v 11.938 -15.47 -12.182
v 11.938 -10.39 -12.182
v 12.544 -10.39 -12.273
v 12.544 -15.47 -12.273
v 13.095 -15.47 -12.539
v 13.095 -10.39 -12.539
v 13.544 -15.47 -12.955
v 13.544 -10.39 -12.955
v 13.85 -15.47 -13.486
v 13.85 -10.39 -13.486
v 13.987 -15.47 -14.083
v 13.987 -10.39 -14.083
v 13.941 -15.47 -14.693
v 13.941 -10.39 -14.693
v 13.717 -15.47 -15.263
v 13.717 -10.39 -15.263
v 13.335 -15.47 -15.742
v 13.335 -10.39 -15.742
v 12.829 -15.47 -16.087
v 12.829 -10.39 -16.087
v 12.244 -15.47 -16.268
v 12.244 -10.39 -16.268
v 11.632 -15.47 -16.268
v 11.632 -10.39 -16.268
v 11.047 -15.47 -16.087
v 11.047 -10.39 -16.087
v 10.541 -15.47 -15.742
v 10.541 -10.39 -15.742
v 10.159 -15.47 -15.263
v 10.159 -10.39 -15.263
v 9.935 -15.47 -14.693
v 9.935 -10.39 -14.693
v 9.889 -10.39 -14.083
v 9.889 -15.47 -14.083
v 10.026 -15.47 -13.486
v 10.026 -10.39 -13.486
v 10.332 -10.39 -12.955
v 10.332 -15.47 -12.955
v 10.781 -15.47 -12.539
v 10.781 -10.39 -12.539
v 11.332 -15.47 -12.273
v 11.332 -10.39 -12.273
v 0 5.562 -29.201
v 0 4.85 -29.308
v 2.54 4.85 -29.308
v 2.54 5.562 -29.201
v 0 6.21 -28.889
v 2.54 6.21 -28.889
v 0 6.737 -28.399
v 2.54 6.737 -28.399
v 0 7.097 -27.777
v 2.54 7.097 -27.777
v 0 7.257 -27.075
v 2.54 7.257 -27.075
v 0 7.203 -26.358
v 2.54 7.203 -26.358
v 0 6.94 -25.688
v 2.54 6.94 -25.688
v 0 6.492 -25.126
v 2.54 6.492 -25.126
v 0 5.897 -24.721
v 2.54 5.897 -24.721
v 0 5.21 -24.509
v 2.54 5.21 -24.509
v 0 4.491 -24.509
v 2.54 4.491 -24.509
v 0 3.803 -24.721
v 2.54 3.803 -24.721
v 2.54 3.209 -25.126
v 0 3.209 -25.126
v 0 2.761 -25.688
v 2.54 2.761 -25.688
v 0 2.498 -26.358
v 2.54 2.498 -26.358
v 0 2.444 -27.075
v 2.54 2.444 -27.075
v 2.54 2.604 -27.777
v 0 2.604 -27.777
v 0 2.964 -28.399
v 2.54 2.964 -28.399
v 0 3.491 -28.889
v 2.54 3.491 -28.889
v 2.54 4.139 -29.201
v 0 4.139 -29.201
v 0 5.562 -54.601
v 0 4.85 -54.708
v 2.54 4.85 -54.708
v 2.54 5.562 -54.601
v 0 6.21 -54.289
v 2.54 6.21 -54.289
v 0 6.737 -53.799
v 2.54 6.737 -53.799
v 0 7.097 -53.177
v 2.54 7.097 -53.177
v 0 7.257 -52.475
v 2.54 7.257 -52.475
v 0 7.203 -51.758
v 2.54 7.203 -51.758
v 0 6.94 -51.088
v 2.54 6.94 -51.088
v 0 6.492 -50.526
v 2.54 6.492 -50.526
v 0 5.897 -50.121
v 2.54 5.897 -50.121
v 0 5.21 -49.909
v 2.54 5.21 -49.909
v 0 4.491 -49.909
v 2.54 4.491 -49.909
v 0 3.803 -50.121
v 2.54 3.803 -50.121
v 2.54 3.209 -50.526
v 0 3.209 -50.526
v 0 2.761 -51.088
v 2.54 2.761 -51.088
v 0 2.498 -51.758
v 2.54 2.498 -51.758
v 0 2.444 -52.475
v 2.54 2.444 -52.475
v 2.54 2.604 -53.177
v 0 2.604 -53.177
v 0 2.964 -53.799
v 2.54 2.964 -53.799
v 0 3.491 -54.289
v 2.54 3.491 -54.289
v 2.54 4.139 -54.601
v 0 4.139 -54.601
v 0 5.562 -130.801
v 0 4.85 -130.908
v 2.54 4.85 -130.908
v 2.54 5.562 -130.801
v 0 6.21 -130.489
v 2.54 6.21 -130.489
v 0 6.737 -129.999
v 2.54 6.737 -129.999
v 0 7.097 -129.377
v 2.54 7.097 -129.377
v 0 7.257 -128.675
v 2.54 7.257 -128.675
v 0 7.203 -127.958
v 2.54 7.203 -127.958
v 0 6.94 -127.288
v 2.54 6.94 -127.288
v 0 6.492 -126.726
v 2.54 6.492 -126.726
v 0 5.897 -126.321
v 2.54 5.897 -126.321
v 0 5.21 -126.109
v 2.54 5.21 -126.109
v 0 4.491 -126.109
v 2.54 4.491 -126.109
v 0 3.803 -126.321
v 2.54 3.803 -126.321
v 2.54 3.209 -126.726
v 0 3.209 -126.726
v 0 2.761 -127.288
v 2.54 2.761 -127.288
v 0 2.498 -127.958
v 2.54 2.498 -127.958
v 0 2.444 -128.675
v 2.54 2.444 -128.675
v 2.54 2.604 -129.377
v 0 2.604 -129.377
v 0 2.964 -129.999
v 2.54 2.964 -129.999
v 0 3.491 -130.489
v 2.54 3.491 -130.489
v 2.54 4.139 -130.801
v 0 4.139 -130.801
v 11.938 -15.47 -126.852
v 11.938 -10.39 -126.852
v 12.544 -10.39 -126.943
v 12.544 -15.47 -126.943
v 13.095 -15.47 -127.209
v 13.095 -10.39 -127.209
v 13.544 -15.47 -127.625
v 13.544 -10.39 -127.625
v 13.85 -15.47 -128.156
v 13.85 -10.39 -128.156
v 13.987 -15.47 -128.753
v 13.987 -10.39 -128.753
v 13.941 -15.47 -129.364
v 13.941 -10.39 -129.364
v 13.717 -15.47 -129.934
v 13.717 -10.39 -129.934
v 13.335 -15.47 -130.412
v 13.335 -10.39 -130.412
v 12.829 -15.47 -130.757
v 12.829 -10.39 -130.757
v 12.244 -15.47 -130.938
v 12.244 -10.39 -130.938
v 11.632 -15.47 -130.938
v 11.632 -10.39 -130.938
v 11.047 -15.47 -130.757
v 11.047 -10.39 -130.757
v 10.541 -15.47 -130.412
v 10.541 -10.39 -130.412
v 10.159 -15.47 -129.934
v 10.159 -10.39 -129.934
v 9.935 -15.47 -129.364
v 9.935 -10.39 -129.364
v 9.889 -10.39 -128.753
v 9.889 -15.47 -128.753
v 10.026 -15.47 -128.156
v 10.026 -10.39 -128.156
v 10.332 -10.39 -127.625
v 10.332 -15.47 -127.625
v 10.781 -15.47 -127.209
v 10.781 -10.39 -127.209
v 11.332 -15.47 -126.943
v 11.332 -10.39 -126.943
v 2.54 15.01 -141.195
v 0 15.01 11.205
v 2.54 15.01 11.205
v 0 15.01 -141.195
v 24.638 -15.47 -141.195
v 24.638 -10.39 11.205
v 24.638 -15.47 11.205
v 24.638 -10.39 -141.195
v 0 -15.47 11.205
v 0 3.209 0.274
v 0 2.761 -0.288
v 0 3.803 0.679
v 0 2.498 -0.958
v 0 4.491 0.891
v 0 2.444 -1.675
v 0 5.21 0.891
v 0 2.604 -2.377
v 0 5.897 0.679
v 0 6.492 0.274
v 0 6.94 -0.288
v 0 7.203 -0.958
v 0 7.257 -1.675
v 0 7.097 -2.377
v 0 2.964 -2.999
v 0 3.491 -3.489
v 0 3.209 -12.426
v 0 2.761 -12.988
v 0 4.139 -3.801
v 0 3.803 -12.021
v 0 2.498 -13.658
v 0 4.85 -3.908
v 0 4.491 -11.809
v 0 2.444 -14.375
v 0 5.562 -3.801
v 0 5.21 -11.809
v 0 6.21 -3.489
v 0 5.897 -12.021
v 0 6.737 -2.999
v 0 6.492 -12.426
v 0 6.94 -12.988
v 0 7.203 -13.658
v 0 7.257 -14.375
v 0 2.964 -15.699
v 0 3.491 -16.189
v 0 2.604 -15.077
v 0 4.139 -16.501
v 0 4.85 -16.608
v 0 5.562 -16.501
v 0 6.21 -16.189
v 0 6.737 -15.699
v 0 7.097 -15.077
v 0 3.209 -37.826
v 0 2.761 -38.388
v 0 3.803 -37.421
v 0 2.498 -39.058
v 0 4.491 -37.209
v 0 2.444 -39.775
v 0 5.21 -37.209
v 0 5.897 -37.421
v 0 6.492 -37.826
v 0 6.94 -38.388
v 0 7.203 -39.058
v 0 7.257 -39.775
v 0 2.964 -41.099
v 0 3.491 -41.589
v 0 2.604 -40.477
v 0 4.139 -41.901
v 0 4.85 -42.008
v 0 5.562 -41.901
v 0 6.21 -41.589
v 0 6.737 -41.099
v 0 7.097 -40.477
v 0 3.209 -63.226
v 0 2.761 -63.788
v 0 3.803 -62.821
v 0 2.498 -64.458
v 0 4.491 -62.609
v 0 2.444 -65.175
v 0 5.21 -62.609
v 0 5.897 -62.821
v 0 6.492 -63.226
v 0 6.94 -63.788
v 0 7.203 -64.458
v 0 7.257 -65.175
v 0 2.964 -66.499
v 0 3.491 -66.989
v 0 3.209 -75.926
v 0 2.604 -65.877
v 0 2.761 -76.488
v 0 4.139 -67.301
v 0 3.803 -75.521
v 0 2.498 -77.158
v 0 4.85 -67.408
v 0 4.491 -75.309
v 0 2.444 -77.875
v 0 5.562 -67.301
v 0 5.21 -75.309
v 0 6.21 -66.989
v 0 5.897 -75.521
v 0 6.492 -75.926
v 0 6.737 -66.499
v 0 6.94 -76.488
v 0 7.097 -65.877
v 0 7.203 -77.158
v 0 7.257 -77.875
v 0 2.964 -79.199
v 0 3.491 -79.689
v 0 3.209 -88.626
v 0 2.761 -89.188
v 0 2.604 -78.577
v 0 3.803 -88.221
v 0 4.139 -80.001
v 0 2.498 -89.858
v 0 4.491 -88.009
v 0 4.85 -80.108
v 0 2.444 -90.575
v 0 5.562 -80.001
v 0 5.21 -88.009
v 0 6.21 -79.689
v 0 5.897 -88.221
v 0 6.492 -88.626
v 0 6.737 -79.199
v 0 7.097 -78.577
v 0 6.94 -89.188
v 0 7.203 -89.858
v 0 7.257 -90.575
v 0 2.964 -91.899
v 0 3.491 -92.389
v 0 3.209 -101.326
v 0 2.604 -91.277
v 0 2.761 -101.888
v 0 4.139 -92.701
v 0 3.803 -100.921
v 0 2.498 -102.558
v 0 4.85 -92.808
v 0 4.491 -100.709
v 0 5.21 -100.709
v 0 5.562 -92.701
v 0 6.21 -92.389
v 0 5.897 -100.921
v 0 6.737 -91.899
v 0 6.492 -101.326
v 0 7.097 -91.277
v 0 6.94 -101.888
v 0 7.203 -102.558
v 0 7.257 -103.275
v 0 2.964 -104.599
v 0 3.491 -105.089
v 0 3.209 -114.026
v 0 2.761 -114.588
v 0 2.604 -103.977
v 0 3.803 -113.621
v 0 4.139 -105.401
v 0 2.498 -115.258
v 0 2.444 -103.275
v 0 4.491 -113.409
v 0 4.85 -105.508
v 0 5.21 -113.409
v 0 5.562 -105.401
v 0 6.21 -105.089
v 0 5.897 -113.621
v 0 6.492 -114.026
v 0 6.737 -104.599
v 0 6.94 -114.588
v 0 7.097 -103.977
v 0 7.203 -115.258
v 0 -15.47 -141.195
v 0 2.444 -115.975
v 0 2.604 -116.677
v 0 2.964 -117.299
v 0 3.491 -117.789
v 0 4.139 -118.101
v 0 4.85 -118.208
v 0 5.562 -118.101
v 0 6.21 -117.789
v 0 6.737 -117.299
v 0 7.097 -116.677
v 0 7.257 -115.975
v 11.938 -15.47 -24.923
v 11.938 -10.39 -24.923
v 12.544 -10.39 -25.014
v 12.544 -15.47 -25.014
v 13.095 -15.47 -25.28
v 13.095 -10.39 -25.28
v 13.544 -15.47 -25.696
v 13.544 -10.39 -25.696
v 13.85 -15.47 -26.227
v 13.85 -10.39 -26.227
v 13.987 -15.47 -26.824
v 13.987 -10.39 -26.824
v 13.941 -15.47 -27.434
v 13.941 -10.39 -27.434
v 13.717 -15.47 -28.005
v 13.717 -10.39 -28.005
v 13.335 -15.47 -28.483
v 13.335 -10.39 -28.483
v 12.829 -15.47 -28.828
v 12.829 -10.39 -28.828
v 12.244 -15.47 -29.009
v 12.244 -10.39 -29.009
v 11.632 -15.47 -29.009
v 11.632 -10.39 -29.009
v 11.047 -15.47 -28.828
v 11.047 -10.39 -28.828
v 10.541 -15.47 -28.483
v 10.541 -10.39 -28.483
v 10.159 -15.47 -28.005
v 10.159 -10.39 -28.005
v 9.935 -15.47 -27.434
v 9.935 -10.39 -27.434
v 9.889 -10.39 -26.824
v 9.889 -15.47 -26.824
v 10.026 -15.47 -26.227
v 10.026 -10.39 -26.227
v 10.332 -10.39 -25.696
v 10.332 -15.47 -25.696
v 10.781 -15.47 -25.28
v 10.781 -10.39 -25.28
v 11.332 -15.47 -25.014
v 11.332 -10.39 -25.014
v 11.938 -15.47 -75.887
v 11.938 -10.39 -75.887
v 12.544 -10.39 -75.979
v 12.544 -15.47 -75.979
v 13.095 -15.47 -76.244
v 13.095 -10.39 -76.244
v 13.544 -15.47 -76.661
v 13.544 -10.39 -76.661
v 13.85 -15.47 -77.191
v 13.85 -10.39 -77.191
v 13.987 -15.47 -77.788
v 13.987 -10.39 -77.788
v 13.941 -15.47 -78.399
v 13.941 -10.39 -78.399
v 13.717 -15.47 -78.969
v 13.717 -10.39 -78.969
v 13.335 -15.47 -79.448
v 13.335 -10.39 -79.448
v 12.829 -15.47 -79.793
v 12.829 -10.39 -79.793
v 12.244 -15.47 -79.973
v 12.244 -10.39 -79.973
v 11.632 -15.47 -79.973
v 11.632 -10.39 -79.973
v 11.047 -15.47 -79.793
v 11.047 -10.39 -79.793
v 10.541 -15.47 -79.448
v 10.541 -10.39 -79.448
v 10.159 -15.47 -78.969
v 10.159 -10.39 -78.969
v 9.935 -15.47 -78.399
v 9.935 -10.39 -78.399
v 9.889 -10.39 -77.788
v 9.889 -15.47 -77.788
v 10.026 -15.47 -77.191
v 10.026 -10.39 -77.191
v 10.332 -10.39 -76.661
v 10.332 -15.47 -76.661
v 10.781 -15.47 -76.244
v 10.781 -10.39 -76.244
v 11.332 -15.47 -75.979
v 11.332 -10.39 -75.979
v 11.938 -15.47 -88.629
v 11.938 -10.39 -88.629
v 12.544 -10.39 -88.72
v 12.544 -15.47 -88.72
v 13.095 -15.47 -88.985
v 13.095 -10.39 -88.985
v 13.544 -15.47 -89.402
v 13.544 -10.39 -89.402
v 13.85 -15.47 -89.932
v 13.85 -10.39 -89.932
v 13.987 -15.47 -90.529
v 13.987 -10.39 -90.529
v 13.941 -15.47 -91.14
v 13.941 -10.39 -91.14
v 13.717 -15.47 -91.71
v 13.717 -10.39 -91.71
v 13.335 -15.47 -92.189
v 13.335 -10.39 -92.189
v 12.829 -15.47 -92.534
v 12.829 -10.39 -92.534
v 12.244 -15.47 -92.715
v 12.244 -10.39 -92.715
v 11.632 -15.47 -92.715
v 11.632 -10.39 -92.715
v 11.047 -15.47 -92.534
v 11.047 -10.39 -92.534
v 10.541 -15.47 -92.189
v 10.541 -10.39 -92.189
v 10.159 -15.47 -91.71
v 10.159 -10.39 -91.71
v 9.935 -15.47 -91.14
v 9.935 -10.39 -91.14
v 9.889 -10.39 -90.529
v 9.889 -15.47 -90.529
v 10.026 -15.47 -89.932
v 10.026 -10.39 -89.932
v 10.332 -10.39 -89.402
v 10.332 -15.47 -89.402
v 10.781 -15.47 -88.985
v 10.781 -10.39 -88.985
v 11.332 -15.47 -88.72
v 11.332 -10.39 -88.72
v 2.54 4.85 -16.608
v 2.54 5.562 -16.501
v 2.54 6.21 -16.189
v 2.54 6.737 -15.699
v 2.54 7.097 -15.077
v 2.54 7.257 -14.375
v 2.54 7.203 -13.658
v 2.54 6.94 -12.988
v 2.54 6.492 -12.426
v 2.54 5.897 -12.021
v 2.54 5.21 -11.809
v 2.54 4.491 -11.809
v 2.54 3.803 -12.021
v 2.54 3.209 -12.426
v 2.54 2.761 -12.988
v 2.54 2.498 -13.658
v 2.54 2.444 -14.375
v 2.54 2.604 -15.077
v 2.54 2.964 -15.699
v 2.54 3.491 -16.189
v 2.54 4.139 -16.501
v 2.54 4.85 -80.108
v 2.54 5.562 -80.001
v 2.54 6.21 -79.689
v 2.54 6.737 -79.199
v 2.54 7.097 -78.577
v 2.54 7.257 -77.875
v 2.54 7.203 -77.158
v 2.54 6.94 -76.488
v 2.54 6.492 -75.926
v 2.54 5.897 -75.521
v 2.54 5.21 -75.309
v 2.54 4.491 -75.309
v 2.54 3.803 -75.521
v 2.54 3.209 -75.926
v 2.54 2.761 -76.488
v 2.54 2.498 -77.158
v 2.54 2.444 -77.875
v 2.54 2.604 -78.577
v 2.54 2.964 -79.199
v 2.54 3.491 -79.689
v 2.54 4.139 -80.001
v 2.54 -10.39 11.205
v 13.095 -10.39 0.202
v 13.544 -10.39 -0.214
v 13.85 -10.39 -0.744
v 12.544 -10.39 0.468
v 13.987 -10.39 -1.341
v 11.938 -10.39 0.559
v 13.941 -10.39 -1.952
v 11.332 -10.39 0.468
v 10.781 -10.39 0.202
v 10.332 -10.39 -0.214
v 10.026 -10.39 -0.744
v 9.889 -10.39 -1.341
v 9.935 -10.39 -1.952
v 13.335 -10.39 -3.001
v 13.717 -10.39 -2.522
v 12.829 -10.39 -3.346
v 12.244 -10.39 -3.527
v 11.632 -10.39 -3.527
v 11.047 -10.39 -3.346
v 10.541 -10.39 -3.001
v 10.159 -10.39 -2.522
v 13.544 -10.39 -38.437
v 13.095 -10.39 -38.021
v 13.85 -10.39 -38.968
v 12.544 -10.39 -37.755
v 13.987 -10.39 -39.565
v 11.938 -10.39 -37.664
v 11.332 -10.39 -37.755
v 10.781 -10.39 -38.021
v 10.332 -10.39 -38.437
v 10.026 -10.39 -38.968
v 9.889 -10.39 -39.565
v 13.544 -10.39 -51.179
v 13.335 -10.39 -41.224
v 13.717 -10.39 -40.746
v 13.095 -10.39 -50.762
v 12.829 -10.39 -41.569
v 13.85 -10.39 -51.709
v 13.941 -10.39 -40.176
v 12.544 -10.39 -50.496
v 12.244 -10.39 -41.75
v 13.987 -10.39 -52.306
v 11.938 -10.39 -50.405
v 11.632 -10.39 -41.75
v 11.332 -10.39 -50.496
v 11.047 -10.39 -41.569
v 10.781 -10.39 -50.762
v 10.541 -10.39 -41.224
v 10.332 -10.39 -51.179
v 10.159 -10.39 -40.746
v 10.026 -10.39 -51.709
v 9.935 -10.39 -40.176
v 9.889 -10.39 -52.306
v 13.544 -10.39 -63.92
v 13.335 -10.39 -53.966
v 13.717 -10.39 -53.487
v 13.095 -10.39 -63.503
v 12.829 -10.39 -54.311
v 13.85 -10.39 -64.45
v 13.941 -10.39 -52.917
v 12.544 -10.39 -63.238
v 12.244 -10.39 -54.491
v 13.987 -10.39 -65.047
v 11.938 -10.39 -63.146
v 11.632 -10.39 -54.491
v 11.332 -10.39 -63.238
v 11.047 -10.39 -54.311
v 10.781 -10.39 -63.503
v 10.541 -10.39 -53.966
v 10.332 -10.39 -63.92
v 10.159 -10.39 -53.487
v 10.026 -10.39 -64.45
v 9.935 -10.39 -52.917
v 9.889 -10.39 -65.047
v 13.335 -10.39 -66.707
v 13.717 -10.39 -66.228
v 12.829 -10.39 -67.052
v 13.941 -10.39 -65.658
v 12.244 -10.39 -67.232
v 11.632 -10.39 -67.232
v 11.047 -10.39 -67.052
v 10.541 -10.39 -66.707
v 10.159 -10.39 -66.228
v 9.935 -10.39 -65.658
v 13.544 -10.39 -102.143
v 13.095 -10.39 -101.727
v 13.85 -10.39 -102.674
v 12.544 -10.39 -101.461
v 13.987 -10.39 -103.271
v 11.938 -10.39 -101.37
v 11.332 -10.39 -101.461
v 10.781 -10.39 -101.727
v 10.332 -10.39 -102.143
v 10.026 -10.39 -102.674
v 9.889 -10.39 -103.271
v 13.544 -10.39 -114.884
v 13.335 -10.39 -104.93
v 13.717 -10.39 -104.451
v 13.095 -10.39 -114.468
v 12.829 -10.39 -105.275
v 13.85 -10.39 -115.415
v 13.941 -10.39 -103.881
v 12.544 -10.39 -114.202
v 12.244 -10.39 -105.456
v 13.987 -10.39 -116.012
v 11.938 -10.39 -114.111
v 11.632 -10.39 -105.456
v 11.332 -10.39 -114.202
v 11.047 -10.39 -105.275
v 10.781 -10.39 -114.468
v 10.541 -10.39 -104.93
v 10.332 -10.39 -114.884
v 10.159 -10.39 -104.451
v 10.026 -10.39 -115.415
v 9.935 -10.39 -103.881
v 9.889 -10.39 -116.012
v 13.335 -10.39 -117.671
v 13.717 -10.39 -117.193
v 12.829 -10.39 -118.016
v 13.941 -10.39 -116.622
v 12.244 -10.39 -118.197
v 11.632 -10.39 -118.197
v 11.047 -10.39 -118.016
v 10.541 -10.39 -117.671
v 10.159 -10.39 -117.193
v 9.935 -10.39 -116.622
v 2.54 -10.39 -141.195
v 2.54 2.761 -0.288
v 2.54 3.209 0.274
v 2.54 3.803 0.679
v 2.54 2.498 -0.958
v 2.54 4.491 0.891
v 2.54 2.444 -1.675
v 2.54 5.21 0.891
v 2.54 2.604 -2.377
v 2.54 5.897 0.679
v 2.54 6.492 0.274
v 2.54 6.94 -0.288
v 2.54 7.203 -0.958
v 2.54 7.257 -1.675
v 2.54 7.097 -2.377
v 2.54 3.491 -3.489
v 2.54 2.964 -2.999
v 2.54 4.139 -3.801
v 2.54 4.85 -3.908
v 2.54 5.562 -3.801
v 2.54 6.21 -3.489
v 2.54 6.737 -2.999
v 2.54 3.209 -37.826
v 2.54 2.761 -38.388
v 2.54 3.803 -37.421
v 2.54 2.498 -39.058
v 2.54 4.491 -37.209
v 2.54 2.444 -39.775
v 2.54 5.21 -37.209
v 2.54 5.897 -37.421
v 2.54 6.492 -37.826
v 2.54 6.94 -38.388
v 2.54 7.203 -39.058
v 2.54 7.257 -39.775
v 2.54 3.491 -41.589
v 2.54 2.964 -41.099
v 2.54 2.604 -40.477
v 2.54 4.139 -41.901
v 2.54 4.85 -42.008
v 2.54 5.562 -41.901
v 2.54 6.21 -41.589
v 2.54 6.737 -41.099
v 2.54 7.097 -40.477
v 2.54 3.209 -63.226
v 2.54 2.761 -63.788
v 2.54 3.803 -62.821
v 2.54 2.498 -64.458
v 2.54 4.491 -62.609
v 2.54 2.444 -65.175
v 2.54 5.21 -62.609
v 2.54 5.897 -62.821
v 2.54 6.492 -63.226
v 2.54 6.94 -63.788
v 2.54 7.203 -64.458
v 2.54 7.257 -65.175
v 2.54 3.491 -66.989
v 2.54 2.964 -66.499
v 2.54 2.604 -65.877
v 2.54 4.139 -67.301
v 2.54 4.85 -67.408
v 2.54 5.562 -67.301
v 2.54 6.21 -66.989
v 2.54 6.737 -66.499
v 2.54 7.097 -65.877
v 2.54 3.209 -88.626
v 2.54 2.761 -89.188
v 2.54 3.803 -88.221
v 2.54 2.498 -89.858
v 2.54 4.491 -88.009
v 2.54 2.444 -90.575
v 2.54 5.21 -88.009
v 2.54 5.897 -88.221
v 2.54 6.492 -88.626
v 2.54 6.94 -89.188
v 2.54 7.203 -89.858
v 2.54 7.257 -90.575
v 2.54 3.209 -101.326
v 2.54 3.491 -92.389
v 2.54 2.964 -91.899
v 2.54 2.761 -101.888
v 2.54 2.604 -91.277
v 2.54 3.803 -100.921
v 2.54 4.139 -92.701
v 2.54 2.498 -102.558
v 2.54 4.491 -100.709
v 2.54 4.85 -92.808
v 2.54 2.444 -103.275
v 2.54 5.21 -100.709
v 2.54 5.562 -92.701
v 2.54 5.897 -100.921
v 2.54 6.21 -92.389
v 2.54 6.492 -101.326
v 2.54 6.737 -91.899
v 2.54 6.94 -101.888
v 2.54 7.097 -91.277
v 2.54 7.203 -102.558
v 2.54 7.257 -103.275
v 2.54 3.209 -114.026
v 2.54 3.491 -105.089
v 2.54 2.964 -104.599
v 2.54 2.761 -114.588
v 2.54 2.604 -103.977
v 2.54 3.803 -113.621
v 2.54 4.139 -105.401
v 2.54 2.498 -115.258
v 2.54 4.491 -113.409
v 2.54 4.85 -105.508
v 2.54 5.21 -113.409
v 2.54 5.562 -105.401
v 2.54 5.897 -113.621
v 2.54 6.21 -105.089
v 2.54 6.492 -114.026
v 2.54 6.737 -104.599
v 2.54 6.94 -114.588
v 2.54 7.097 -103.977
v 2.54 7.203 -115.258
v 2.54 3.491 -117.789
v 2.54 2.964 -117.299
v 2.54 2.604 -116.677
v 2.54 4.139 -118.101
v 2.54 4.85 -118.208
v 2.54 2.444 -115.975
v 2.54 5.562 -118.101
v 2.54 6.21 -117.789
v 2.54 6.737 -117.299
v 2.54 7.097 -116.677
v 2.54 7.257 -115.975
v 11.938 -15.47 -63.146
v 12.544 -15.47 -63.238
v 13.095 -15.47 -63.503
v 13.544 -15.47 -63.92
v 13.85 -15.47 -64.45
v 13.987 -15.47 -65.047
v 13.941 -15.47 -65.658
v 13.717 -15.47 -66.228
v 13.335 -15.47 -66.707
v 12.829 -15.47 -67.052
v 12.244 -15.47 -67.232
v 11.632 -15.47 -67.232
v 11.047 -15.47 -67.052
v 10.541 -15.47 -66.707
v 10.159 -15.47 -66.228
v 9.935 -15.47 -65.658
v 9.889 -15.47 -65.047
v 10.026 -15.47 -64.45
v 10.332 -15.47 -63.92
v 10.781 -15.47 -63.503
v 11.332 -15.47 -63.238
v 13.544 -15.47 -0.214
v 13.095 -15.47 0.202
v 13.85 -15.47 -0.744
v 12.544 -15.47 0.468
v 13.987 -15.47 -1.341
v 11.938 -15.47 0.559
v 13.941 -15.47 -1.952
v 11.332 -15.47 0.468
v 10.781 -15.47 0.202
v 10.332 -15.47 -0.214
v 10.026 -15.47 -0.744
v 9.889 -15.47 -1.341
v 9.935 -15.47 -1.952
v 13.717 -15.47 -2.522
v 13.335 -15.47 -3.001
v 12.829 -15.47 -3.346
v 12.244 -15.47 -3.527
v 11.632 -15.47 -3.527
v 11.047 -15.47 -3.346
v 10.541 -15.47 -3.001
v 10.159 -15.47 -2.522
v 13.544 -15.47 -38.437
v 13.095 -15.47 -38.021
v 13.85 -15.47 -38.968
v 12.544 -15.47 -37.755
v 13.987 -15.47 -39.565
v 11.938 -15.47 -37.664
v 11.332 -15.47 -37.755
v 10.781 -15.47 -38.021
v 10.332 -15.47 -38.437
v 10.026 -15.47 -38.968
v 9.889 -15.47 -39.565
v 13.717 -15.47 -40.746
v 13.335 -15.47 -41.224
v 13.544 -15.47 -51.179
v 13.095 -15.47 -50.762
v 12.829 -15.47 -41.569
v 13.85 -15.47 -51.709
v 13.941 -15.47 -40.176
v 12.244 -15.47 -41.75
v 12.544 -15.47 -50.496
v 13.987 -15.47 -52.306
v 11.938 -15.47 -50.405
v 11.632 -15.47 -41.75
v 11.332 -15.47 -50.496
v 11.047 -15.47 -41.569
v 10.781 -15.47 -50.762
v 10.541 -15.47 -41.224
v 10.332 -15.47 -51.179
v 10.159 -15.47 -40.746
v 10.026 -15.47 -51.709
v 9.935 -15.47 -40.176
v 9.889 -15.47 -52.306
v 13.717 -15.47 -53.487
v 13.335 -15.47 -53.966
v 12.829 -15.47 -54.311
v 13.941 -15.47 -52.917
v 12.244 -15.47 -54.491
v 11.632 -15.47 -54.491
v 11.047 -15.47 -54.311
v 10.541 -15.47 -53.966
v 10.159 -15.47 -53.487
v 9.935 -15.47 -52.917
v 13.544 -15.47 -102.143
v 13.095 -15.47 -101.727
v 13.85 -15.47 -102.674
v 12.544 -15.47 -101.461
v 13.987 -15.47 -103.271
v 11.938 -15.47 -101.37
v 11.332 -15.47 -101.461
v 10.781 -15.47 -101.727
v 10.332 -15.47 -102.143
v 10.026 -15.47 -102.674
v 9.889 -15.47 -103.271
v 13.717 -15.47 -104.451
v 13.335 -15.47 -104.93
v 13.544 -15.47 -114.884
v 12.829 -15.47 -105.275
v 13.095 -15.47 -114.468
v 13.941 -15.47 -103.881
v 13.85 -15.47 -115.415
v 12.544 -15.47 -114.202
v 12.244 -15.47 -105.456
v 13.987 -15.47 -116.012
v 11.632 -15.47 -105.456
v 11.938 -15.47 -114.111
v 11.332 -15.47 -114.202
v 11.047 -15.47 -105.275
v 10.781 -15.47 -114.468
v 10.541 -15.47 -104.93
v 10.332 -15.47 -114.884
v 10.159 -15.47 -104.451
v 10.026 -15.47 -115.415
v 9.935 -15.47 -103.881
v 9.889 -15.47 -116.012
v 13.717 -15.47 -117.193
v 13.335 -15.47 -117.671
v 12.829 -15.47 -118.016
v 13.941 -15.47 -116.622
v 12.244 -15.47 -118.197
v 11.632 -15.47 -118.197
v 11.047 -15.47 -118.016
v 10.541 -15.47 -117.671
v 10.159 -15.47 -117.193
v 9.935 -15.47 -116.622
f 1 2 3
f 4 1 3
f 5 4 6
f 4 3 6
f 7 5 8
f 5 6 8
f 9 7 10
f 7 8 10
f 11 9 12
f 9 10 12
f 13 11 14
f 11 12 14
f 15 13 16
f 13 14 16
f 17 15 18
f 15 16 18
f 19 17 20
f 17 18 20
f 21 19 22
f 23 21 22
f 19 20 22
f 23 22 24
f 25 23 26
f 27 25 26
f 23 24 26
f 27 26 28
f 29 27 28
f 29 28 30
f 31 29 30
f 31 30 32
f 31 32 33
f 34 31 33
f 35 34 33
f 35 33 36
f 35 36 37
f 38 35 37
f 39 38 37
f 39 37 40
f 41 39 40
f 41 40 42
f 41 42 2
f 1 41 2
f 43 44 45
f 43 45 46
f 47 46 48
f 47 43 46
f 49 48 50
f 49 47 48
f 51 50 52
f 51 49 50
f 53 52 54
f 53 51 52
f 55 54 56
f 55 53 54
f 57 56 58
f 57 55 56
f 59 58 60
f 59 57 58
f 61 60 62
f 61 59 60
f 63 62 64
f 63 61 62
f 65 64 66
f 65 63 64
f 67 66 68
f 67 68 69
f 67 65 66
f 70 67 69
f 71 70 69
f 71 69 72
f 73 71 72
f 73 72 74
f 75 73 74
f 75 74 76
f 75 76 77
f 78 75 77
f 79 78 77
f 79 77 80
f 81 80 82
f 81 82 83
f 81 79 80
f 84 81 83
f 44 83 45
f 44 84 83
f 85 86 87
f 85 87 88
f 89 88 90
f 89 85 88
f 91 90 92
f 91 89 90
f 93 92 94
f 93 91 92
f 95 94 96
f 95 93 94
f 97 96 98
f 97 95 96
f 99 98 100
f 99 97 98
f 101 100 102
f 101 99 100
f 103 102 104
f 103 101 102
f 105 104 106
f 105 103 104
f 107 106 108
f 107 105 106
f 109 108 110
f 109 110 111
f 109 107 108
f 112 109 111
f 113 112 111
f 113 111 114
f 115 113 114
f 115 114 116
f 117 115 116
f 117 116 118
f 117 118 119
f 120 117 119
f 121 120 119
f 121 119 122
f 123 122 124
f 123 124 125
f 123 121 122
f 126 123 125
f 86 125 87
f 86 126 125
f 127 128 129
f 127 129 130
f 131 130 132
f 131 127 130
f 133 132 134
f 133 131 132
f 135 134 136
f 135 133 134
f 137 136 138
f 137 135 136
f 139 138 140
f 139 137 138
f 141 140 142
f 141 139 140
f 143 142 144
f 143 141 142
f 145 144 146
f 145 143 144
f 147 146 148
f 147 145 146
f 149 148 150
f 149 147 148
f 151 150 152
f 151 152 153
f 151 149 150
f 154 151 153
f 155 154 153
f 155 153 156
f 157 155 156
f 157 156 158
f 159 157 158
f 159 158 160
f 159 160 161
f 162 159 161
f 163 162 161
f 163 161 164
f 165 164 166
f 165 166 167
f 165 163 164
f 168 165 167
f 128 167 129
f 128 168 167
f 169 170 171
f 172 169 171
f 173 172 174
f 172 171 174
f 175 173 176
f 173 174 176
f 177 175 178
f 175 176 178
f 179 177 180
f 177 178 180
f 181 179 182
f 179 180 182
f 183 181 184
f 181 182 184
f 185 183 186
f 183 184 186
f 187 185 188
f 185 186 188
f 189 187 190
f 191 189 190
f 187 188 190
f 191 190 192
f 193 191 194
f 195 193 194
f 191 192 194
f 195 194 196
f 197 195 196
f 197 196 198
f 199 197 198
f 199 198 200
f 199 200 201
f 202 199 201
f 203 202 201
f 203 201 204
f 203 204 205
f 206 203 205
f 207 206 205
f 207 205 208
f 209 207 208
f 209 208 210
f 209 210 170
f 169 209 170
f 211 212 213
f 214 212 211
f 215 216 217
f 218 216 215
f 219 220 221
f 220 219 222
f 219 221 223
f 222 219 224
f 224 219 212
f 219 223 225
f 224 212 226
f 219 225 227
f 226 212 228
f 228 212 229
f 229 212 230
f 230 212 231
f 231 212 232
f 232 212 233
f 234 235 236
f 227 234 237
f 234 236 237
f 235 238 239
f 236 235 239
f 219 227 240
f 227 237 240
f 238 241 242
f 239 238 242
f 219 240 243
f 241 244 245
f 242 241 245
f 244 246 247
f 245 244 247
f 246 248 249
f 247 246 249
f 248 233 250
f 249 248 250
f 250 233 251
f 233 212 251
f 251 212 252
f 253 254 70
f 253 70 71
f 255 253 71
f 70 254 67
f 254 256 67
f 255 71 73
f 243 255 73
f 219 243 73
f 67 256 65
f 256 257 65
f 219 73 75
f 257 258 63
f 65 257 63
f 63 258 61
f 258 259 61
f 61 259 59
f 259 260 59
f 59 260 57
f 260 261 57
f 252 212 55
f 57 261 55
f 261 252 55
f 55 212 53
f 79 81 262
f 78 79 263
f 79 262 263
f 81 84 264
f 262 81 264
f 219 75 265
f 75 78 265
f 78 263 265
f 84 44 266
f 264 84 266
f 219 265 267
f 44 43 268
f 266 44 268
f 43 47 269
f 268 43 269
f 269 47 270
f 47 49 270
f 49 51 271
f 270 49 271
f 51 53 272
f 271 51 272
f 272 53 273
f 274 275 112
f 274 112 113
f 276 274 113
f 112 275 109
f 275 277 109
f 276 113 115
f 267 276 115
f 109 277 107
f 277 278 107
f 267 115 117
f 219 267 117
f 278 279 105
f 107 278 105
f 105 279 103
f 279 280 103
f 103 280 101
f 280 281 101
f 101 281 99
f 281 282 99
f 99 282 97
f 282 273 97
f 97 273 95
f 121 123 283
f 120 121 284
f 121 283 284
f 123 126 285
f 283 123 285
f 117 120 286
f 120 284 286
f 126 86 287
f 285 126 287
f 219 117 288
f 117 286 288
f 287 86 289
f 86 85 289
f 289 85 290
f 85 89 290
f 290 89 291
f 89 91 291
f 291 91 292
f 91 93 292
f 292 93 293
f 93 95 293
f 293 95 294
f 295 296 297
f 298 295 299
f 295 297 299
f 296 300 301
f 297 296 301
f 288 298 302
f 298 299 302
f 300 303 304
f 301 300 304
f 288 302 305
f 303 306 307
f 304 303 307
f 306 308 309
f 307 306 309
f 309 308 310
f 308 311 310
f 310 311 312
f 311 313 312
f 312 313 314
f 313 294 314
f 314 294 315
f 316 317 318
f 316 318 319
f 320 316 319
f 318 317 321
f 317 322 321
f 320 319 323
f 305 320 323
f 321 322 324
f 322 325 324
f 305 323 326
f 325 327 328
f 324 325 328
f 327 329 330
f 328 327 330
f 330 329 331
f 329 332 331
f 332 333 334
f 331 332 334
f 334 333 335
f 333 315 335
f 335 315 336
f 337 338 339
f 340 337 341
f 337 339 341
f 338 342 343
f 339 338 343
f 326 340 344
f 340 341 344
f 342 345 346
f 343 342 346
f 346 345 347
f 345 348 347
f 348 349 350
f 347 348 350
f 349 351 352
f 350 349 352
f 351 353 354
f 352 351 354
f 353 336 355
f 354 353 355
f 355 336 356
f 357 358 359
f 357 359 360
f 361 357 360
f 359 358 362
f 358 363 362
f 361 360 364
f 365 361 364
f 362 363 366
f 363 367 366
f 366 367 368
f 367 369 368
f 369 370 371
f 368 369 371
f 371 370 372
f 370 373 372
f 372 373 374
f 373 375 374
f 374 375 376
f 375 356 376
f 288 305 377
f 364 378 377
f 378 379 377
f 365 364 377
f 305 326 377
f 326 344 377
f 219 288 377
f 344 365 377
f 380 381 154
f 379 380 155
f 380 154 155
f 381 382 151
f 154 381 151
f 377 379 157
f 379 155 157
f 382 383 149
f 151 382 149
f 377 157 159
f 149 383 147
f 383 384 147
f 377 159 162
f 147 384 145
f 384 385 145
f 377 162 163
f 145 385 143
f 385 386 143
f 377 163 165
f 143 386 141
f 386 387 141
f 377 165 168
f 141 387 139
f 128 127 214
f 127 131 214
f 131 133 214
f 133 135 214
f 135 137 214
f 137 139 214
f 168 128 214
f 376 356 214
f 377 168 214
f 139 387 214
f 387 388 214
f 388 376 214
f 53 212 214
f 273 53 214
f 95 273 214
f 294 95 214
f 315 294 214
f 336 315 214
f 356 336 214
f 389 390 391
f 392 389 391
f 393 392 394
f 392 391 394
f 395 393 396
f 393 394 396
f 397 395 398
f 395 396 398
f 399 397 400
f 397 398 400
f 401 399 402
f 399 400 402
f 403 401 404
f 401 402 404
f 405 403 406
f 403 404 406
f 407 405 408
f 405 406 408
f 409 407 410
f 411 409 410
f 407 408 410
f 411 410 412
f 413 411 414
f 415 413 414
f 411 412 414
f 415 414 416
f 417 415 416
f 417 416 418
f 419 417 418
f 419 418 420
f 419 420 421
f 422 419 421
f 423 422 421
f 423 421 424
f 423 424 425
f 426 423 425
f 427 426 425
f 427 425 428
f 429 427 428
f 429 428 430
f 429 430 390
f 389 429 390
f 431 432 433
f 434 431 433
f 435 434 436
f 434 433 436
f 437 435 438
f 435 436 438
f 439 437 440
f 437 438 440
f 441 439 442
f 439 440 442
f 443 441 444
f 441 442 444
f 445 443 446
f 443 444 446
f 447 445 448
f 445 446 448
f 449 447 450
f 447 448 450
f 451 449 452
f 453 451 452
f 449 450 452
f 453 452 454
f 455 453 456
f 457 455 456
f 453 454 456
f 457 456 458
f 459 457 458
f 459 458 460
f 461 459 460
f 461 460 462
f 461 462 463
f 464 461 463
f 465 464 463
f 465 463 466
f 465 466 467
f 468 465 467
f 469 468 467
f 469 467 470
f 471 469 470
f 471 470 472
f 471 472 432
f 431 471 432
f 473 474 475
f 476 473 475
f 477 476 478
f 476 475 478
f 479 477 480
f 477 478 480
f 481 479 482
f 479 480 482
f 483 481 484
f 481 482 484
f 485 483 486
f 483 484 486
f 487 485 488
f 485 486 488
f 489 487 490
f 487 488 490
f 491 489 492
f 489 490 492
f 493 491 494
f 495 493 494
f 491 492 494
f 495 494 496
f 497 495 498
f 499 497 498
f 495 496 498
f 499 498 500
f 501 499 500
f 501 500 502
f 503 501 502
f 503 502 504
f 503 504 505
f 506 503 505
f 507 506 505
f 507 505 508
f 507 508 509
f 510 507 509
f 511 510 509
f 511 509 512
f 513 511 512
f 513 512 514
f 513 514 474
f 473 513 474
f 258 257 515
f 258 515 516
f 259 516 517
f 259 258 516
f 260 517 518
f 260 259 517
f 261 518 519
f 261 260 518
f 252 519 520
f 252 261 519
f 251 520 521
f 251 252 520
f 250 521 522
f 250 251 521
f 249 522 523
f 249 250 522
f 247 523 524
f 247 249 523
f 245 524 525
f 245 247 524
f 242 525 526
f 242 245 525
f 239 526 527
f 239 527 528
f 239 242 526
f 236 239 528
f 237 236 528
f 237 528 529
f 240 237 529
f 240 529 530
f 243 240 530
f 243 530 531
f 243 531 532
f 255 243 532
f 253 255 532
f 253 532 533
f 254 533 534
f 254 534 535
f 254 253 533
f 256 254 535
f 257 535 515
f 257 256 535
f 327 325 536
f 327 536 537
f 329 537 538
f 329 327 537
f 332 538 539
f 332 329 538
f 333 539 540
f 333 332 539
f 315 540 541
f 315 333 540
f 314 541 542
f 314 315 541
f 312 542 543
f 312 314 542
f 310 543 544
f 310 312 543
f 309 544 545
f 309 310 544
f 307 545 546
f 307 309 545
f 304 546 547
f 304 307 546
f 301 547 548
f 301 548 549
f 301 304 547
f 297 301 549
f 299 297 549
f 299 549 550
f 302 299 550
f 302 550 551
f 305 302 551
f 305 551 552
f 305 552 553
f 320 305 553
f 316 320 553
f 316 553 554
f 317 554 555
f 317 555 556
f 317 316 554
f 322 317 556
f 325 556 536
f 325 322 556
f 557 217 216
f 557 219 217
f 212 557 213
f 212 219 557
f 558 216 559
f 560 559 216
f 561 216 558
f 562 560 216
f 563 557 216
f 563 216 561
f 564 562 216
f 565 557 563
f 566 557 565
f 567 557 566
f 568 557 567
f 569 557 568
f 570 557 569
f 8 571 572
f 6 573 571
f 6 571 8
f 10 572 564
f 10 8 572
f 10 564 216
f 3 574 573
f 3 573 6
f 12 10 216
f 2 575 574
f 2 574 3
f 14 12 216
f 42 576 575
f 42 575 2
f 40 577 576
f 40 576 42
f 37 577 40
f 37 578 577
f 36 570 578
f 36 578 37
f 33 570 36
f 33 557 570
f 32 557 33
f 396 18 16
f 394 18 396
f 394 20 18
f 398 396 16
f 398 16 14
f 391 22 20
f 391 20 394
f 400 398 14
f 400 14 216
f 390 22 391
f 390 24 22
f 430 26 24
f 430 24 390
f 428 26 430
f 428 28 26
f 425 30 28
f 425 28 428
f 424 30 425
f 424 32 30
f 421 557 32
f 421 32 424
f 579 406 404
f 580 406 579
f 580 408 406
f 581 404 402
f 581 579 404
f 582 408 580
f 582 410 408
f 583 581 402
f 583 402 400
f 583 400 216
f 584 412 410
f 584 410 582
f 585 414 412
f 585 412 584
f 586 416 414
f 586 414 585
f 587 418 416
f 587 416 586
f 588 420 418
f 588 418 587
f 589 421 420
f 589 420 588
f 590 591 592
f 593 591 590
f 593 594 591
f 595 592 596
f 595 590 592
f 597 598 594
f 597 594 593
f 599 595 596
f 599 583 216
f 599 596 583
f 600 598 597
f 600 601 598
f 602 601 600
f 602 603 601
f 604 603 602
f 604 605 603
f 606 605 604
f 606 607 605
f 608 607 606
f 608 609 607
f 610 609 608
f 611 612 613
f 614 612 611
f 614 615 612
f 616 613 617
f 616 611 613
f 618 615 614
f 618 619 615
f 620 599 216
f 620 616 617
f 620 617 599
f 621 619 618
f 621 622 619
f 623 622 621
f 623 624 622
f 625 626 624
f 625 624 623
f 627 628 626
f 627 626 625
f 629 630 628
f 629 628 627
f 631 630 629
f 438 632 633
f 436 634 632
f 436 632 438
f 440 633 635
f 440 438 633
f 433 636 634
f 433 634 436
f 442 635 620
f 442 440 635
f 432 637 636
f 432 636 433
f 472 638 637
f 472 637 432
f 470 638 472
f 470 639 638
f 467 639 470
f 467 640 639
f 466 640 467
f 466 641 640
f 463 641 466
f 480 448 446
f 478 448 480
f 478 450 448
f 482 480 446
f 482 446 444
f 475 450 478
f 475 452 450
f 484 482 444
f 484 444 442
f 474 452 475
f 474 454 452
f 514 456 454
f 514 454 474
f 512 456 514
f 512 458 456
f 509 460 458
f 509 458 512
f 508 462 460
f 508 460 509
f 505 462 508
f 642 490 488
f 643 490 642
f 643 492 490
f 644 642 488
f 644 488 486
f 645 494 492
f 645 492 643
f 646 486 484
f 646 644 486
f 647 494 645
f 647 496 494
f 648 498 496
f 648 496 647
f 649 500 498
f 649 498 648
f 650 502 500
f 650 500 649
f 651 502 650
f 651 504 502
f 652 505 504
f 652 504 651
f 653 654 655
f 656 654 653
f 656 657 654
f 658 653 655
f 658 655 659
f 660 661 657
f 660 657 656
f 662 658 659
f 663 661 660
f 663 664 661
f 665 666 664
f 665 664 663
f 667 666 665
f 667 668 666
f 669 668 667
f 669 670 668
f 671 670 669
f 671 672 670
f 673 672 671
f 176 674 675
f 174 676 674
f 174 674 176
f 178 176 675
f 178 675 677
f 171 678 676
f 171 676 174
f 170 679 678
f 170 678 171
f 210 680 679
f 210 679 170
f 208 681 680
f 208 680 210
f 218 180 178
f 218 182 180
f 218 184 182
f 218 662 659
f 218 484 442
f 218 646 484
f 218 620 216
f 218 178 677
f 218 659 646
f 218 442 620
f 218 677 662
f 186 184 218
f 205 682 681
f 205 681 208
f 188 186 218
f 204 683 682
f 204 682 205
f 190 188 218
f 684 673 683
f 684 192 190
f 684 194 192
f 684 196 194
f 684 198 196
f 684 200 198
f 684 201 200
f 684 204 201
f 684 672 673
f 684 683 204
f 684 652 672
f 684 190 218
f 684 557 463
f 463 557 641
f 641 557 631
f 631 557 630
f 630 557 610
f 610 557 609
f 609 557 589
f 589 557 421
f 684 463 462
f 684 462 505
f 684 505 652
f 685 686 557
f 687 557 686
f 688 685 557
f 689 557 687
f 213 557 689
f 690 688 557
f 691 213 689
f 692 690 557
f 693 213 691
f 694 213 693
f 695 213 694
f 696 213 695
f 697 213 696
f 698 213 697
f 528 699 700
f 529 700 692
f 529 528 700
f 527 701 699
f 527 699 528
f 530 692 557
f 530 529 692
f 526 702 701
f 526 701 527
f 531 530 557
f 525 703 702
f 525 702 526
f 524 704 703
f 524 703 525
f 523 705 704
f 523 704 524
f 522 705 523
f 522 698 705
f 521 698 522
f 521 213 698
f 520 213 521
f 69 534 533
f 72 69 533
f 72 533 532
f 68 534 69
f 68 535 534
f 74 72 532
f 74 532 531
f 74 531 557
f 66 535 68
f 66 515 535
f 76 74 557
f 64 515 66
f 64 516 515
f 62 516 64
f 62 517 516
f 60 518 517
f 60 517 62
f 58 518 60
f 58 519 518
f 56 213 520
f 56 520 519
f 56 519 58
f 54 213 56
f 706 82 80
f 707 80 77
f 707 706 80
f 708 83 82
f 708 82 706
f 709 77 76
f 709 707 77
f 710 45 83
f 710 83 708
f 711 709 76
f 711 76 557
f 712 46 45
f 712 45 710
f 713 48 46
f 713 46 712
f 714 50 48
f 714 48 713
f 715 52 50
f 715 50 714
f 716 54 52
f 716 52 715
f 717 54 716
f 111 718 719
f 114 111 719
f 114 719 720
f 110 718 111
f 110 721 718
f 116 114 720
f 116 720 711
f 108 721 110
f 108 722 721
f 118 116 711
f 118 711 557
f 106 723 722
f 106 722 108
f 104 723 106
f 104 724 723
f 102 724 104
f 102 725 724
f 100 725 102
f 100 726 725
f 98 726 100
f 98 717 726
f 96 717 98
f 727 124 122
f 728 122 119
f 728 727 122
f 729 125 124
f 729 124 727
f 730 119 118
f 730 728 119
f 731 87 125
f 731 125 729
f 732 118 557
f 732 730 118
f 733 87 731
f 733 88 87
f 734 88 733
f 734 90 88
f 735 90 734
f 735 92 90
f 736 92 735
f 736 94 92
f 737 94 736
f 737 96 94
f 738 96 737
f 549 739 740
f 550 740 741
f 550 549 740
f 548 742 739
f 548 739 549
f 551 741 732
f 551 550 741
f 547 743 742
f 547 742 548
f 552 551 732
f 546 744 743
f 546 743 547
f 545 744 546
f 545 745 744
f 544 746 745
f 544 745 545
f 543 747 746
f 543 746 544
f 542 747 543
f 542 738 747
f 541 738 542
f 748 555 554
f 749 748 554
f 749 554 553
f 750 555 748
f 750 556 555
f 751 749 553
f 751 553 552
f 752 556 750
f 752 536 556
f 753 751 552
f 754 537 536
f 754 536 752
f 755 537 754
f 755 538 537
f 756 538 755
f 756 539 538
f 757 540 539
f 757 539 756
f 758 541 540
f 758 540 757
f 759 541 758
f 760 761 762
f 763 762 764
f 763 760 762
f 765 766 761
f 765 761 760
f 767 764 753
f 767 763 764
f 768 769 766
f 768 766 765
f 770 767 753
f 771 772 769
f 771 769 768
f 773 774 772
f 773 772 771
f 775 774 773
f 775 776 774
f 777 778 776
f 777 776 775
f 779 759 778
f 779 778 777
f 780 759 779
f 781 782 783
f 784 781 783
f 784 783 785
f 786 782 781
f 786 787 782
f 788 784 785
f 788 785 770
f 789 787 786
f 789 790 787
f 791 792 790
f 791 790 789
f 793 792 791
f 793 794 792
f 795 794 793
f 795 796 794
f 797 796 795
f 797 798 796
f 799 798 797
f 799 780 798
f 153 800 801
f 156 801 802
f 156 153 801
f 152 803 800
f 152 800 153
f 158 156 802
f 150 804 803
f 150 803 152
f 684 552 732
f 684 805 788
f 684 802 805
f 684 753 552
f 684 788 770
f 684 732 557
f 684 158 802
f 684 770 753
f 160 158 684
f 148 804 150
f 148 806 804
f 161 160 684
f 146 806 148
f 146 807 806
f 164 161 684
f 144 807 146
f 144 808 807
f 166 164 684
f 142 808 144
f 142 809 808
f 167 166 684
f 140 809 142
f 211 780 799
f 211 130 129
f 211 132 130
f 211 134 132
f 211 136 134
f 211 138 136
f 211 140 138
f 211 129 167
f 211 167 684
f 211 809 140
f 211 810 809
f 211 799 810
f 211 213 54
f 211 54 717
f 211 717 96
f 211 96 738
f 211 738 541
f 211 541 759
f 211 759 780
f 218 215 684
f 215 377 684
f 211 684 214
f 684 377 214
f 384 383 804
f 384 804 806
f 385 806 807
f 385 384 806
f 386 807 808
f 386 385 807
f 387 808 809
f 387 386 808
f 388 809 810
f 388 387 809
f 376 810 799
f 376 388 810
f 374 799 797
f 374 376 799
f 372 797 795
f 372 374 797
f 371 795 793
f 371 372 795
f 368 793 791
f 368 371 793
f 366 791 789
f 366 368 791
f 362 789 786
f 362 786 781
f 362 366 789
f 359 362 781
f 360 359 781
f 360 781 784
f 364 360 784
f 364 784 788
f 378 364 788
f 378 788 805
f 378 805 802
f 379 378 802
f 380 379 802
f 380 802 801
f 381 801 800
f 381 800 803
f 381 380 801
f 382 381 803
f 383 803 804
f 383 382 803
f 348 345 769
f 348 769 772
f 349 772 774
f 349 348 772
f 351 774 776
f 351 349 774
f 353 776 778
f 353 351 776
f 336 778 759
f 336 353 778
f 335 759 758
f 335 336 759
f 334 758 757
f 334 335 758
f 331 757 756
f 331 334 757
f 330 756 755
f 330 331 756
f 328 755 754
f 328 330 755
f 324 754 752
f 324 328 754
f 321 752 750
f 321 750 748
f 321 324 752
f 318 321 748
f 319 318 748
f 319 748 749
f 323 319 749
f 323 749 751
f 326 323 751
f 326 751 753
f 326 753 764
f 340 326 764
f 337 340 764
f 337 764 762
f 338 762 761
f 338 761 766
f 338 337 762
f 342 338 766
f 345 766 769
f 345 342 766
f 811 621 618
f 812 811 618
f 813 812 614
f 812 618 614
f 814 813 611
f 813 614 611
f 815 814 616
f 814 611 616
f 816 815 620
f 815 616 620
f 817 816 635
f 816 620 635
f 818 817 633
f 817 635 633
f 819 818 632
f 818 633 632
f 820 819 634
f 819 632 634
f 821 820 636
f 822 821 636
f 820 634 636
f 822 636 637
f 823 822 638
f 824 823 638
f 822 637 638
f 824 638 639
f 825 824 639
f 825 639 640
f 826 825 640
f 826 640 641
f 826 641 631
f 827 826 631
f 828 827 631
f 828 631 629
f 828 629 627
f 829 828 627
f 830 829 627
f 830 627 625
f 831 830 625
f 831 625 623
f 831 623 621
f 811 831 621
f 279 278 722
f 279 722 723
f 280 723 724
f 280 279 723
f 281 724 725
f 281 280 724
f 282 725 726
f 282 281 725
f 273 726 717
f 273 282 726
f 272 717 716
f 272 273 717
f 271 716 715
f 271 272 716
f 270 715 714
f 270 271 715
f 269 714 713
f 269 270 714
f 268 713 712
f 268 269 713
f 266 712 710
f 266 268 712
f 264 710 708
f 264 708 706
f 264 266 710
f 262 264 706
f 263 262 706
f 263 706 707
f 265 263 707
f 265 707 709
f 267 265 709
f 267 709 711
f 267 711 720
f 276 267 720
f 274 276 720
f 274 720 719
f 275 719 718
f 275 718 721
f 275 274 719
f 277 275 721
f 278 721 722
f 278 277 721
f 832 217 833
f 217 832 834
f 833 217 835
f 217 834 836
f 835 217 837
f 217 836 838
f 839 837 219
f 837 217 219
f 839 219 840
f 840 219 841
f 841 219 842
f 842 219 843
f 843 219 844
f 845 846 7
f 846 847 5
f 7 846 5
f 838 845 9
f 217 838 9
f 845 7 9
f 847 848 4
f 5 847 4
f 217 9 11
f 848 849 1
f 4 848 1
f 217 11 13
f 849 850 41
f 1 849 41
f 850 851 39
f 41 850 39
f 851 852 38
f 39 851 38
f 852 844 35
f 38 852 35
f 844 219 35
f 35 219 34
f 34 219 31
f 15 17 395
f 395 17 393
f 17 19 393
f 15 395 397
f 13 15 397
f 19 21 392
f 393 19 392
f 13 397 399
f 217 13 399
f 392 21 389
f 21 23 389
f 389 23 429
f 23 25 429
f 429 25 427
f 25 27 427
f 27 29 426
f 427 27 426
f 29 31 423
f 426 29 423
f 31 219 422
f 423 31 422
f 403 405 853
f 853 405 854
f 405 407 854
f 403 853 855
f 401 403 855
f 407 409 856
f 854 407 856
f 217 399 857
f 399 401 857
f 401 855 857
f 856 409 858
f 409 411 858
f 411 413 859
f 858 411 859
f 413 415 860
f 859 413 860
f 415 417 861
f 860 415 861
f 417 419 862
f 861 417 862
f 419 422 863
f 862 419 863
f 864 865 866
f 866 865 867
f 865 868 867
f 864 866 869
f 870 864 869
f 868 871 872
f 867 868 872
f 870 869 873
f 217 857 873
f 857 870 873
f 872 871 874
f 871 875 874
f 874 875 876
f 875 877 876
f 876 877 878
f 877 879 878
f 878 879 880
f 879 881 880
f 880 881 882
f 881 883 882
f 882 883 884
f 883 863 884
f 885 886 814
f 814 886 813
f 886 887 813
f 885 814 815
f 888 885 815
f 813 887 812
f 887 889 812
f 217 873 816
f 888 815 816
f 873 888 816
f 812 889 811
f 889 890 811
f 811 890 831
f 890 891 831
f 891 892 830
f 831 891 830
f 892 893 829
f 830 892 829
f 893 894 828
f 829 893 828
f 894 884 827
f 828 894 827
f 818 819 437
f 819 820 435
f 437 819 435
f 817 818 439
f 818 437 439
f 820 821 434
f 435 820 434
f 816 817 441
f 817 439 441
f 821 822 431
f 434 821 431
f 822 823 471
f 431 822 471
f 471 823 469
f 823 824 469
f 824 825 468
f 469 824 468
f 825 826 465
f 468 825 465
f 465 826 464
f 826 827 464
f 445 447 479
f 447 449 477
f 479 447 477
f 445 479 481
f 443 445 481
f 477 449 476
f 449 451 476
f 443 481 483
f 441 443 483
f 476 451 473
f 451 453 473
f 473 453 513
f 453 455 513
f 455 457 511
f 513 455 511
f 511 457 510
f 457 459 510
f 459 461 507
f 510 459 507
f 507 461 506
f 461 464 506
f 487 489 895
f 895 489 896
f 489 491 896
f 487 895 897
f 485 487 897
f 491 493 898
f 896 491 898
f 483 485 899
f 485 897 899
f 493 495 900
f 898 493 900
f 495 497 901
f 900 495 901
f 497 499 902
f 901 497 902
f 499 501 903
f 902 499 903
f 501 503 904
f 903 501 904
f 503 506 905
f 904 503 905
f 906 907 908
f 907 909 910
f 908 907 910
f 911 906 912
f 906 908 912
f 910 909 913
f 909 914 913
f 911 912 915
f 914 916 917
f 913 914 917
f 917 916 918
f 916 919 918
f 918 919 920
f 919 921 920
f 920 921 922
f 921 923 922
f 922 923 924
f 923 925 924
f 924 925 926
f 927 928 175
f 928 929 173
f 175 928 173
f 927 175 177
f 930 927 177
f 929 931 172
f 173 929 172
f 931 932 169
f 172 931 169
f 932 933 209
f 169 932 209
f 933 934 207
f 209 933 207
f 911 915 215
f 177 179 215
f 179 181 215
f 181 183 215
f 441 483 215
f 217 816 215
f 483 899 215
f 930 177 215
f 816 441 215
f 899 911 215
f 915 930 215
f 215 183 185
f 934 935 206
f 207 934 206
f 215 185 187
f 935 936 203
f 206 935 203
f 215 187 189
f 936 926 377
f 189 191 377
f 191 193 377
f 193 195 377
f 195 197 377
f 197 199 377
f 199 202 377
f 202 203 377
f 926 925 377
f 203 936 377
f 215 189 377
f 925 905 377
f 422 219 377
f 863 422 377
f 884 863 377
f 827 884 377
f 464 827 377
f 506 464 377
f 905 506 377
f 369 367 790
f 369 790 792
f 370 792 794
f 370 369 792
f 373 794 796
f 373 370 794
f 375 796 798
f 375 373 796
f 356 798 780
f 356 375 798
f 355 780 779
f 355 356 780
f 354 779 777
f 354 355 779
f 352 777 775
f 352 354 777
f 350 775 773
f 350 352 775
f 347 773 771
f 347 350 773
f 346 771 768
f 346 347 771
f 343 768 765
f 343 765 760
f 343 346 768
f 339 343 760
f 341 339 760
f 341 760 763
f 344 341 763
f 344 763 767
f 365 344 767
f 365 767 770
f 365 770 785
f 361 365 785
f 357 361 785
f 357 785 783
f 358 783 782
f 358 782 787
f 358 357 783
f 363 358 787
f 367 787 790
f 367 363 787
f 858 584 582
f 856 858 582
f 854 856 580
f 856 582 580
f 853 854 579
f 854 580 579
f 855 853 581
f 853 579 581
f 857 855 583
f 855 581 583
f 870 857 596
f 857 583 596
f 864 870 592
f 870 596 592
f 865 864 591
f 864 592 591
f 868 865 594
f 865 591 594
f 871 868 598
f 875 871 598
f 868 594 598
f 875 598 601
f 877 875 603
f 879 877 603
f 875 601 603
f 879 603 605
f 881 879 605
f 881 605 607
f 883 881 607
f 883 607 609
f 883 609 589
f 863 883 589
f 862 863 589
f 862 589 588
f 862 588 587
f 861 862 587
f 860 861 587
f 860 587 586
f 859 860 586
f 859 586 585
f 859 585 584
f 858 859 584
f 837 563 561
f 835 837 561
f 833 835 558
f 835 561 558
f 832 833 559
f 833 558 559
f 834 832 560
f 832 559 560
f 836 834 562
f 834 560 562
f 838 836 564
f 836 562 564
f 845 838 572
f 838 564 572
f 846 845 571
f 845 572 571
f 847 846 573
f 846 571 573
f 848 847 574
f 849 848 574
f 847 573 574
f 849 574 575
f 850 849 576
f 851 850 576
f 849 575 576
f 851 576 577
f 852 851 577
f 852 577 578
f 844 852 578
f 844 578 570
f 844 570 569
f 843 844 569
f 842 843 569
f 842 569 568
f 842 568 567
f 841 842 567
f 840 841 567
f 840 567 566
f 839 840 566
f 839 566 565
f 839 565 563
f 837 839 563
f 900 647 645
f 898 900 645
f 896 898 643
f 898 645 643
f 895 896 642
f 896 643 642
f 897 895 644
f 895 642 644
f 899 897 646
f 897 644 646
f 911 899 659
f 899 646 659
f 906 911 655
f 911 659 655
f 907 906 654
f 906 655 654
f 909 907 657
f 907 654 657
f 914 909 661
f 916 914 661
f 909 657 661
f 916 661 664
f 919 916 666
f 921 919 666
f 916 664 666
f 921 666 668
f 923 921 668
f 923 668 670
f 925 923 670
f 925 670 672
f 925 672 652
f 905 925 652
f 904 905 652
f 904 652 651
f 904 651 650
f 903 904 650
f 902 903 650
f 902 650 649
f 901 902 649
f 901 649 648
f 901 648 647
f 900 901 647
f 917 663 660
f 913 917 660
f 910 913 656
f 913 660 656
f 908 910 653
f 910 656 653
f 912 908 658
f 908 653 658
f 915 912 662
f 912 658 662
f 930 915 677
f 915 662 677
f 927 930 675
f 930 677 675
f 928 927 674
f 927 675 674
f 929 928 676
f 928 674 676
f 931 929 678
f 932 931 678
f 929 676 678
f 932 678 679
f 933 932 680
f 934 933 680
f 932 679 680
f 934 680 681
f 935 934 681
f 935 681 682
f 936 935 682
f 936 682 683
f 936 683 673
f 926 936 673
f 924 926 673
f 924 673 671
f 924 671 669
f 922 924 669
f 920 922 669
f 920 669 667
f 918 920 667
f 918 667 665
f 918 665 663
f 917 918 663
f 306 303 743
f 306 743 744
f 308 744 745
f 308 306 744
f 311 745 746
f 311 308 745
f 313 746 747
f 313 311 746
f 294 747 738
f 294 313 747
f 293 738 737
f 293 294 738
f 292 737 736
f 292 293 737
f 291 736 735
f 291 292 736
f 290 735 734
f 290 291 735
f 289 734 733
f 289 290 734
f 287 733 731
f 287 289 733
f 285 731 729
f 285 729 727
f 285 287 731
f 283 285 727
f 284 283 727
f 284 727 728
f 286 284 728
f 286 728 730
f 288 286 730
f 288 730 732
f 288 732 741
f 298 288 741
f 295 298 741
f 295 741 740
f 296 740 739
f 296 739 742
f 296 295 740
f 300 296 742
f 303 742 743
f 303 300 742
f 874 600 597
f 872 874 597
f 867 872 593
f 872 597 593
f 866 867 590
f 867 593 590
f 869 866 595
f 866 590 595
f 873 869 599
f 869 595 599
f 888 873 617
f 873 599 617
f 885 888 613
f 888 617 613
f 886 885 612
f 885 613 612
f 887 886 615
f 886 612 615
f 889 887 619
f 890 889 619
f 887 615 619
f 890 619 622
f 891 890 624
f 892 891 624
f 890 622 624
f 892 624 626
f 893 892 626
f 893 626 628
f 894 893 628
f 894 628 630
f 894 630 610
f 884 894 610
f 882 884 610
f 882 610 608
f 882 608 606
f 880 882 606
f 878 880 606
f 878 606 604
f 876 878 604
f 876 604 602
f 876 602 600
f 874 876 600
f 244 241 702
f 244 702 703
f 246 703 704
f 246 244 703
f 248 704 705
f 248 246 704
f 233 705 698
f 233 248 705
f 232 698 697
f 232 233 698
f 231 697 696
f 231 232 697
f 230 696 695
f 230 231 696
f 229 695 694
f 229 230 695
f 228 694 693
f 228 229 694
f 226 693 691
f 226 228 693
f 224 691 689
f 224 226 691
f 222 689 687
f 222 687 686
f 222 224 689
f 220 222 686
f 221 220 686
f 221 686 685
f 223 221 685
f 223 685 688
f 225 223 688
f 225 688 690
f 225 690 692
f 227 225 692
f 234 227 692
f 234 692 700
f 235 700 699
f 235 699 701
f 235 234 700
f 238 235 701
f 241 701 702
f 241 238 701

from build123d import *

# Parameters (mm, degrees)
SKETCH1_W           = 152.4
SKETCH1_H           = 30.48
SKETCH1_R           = 2.413
BOSS_EXTRUDE1_DEPTH = 2.54
SKETCH2_W           = 152.4
SKETCH2_H           = 5.08
BOSS_EXTRUDE2_DEPTH = 22.098
SKETCH3_R           = 2.054469346
CUT_EXTRUDE1_DEPTH  = 146.561723888


with BuildPart() as part:
    # Sketch1 → Boss-Extrude1 (new body)
    with BuildSketch(Plane(origin=(0, 0, 0), x_dir=(0, 0, -1), z_dir=(1, 0, 0))):
        with Locations((64.994987224, -0.229680851)):
            Rectangle(SKETCH1_W, SKETCH1_H)
        with Locations((1.494987224, 4.850319149)):
            Circle(SKETCH1_R, mode=Mode.SUBTRACT)
        with Locations((14.194987224, 4.850319149)):
            Circle(SKETCH1_R, mode=Mode.SUBTRACT)
        with Locations((26.894987224, 4.850319149)):
            Circle(SKETCH1_R, mode=Mode.SUBTRACT)
        with Locations((39.594987224, 4.850319149)):
            Circle(SKETCH1_R, mode=Mode.SUBTRACT)
        with Locations((52.294987224, 4.850319149)):
            Circle(SKETCH1_R, mode=Mode.SUBTRACT)
        with Locations((64.994987224, 4.850319149)):
            Circle(SKETCH1_R, mode=Mode.SUBTRACT)
        with Locations((77.694987224, 4.850319149)):
            Circle(SKETCH1_R, mode=Mode.SUBTRACT)
        with Locations((90.394987224, 4.850319149)):
            Circle(SKETCH1_R, mode=Mode.SUBTRACT)
        with Locations((103.094987224, 4.850319149)):
            Circle(SKETCH1_R, mode=Mode.SUBTRACT)
        with Locations((115.794987224, 4.850319149)):
            Circle(SKETCH1_R, mode=Mode.SUBTRACT)
        with Locations((128.494987224, 4.850319149)):
            Circle(SKETCH1_R, mode=Mode.SUBTRACT)
    extrude(amount=BOSS_EXTRUDE1_DEPTH)

    # Sketch2 → Boss-Extrude2 (add)
    with BuildSketch(Plane(origin=(2.54, 0, 0), x_dir=(0, 0, -1), z_dir=(1, 0, 0))):
        with Locations((64.994987224, -12.929680851)):
            Rectangle(SKETCH2_W, SKETCH2_H)
    extrude(amount=BOSS_EXTRUDE2_DEPTH)

    # Sketch3 → Cut-Extrude1 (cut, through all)
    with BuildSketch(Plane(origin=(0, -10.389680851, 0), x_dir=(1, 0, 0), z_dir=(0, 1, 0))):
        with Locations(Location((11.938, 1.494987224, 0), (0, 0, 270))):
            Circle(SKETCH3_R)
        with Locations(Location((11.938, 14.236129272, 0), (0, 0, 270))):
            Circle(SKETCH3_R)
        with Locations(Location((11.938, 26.977271321, 0), (0, 0, 270))):
            Circle(SKETCH3_R)
        with Locations(Location((11.938, 39.71841337, 0), (0, 0, 270))):
            Circle(SKETCH3_R)
        with Locations(Location((11.938, 52.459555419, 0), (0, 0, 270))):
            Circle(SKETCH3_R)
        with Locations(Location((11.938, 65.200697467, 0), (0, 0, 270))):
            Circle(SKETCH3_R)
        with Locations(Location((11.938, 77.941839516, 0), (0, 0, 270))):
            Circle(SKETCH3_R)
        with Locations(Location((11.938, 90.682981565, 0), (0, 0, 270))):
            Circle(SKETCH3_R)
        with Locations(Location((11.938, 103.424123614, 0), (0, 0, 270))):
            Circle(SKETCH3_R)
        with Locations(Location((11.938, 116.165265662, 0), (0, 0, 270))):
            Circle(SKETCH3_R)
        with Locations(Location((11.938, 128.906407711, 0), (0, 0, 270))):
            Circle(SKETCH3_R)
    extrude(amount=-CUT_EXTRUDE1_DEPTH, mode=Mode.SUBTRACT)


solid = part.part
